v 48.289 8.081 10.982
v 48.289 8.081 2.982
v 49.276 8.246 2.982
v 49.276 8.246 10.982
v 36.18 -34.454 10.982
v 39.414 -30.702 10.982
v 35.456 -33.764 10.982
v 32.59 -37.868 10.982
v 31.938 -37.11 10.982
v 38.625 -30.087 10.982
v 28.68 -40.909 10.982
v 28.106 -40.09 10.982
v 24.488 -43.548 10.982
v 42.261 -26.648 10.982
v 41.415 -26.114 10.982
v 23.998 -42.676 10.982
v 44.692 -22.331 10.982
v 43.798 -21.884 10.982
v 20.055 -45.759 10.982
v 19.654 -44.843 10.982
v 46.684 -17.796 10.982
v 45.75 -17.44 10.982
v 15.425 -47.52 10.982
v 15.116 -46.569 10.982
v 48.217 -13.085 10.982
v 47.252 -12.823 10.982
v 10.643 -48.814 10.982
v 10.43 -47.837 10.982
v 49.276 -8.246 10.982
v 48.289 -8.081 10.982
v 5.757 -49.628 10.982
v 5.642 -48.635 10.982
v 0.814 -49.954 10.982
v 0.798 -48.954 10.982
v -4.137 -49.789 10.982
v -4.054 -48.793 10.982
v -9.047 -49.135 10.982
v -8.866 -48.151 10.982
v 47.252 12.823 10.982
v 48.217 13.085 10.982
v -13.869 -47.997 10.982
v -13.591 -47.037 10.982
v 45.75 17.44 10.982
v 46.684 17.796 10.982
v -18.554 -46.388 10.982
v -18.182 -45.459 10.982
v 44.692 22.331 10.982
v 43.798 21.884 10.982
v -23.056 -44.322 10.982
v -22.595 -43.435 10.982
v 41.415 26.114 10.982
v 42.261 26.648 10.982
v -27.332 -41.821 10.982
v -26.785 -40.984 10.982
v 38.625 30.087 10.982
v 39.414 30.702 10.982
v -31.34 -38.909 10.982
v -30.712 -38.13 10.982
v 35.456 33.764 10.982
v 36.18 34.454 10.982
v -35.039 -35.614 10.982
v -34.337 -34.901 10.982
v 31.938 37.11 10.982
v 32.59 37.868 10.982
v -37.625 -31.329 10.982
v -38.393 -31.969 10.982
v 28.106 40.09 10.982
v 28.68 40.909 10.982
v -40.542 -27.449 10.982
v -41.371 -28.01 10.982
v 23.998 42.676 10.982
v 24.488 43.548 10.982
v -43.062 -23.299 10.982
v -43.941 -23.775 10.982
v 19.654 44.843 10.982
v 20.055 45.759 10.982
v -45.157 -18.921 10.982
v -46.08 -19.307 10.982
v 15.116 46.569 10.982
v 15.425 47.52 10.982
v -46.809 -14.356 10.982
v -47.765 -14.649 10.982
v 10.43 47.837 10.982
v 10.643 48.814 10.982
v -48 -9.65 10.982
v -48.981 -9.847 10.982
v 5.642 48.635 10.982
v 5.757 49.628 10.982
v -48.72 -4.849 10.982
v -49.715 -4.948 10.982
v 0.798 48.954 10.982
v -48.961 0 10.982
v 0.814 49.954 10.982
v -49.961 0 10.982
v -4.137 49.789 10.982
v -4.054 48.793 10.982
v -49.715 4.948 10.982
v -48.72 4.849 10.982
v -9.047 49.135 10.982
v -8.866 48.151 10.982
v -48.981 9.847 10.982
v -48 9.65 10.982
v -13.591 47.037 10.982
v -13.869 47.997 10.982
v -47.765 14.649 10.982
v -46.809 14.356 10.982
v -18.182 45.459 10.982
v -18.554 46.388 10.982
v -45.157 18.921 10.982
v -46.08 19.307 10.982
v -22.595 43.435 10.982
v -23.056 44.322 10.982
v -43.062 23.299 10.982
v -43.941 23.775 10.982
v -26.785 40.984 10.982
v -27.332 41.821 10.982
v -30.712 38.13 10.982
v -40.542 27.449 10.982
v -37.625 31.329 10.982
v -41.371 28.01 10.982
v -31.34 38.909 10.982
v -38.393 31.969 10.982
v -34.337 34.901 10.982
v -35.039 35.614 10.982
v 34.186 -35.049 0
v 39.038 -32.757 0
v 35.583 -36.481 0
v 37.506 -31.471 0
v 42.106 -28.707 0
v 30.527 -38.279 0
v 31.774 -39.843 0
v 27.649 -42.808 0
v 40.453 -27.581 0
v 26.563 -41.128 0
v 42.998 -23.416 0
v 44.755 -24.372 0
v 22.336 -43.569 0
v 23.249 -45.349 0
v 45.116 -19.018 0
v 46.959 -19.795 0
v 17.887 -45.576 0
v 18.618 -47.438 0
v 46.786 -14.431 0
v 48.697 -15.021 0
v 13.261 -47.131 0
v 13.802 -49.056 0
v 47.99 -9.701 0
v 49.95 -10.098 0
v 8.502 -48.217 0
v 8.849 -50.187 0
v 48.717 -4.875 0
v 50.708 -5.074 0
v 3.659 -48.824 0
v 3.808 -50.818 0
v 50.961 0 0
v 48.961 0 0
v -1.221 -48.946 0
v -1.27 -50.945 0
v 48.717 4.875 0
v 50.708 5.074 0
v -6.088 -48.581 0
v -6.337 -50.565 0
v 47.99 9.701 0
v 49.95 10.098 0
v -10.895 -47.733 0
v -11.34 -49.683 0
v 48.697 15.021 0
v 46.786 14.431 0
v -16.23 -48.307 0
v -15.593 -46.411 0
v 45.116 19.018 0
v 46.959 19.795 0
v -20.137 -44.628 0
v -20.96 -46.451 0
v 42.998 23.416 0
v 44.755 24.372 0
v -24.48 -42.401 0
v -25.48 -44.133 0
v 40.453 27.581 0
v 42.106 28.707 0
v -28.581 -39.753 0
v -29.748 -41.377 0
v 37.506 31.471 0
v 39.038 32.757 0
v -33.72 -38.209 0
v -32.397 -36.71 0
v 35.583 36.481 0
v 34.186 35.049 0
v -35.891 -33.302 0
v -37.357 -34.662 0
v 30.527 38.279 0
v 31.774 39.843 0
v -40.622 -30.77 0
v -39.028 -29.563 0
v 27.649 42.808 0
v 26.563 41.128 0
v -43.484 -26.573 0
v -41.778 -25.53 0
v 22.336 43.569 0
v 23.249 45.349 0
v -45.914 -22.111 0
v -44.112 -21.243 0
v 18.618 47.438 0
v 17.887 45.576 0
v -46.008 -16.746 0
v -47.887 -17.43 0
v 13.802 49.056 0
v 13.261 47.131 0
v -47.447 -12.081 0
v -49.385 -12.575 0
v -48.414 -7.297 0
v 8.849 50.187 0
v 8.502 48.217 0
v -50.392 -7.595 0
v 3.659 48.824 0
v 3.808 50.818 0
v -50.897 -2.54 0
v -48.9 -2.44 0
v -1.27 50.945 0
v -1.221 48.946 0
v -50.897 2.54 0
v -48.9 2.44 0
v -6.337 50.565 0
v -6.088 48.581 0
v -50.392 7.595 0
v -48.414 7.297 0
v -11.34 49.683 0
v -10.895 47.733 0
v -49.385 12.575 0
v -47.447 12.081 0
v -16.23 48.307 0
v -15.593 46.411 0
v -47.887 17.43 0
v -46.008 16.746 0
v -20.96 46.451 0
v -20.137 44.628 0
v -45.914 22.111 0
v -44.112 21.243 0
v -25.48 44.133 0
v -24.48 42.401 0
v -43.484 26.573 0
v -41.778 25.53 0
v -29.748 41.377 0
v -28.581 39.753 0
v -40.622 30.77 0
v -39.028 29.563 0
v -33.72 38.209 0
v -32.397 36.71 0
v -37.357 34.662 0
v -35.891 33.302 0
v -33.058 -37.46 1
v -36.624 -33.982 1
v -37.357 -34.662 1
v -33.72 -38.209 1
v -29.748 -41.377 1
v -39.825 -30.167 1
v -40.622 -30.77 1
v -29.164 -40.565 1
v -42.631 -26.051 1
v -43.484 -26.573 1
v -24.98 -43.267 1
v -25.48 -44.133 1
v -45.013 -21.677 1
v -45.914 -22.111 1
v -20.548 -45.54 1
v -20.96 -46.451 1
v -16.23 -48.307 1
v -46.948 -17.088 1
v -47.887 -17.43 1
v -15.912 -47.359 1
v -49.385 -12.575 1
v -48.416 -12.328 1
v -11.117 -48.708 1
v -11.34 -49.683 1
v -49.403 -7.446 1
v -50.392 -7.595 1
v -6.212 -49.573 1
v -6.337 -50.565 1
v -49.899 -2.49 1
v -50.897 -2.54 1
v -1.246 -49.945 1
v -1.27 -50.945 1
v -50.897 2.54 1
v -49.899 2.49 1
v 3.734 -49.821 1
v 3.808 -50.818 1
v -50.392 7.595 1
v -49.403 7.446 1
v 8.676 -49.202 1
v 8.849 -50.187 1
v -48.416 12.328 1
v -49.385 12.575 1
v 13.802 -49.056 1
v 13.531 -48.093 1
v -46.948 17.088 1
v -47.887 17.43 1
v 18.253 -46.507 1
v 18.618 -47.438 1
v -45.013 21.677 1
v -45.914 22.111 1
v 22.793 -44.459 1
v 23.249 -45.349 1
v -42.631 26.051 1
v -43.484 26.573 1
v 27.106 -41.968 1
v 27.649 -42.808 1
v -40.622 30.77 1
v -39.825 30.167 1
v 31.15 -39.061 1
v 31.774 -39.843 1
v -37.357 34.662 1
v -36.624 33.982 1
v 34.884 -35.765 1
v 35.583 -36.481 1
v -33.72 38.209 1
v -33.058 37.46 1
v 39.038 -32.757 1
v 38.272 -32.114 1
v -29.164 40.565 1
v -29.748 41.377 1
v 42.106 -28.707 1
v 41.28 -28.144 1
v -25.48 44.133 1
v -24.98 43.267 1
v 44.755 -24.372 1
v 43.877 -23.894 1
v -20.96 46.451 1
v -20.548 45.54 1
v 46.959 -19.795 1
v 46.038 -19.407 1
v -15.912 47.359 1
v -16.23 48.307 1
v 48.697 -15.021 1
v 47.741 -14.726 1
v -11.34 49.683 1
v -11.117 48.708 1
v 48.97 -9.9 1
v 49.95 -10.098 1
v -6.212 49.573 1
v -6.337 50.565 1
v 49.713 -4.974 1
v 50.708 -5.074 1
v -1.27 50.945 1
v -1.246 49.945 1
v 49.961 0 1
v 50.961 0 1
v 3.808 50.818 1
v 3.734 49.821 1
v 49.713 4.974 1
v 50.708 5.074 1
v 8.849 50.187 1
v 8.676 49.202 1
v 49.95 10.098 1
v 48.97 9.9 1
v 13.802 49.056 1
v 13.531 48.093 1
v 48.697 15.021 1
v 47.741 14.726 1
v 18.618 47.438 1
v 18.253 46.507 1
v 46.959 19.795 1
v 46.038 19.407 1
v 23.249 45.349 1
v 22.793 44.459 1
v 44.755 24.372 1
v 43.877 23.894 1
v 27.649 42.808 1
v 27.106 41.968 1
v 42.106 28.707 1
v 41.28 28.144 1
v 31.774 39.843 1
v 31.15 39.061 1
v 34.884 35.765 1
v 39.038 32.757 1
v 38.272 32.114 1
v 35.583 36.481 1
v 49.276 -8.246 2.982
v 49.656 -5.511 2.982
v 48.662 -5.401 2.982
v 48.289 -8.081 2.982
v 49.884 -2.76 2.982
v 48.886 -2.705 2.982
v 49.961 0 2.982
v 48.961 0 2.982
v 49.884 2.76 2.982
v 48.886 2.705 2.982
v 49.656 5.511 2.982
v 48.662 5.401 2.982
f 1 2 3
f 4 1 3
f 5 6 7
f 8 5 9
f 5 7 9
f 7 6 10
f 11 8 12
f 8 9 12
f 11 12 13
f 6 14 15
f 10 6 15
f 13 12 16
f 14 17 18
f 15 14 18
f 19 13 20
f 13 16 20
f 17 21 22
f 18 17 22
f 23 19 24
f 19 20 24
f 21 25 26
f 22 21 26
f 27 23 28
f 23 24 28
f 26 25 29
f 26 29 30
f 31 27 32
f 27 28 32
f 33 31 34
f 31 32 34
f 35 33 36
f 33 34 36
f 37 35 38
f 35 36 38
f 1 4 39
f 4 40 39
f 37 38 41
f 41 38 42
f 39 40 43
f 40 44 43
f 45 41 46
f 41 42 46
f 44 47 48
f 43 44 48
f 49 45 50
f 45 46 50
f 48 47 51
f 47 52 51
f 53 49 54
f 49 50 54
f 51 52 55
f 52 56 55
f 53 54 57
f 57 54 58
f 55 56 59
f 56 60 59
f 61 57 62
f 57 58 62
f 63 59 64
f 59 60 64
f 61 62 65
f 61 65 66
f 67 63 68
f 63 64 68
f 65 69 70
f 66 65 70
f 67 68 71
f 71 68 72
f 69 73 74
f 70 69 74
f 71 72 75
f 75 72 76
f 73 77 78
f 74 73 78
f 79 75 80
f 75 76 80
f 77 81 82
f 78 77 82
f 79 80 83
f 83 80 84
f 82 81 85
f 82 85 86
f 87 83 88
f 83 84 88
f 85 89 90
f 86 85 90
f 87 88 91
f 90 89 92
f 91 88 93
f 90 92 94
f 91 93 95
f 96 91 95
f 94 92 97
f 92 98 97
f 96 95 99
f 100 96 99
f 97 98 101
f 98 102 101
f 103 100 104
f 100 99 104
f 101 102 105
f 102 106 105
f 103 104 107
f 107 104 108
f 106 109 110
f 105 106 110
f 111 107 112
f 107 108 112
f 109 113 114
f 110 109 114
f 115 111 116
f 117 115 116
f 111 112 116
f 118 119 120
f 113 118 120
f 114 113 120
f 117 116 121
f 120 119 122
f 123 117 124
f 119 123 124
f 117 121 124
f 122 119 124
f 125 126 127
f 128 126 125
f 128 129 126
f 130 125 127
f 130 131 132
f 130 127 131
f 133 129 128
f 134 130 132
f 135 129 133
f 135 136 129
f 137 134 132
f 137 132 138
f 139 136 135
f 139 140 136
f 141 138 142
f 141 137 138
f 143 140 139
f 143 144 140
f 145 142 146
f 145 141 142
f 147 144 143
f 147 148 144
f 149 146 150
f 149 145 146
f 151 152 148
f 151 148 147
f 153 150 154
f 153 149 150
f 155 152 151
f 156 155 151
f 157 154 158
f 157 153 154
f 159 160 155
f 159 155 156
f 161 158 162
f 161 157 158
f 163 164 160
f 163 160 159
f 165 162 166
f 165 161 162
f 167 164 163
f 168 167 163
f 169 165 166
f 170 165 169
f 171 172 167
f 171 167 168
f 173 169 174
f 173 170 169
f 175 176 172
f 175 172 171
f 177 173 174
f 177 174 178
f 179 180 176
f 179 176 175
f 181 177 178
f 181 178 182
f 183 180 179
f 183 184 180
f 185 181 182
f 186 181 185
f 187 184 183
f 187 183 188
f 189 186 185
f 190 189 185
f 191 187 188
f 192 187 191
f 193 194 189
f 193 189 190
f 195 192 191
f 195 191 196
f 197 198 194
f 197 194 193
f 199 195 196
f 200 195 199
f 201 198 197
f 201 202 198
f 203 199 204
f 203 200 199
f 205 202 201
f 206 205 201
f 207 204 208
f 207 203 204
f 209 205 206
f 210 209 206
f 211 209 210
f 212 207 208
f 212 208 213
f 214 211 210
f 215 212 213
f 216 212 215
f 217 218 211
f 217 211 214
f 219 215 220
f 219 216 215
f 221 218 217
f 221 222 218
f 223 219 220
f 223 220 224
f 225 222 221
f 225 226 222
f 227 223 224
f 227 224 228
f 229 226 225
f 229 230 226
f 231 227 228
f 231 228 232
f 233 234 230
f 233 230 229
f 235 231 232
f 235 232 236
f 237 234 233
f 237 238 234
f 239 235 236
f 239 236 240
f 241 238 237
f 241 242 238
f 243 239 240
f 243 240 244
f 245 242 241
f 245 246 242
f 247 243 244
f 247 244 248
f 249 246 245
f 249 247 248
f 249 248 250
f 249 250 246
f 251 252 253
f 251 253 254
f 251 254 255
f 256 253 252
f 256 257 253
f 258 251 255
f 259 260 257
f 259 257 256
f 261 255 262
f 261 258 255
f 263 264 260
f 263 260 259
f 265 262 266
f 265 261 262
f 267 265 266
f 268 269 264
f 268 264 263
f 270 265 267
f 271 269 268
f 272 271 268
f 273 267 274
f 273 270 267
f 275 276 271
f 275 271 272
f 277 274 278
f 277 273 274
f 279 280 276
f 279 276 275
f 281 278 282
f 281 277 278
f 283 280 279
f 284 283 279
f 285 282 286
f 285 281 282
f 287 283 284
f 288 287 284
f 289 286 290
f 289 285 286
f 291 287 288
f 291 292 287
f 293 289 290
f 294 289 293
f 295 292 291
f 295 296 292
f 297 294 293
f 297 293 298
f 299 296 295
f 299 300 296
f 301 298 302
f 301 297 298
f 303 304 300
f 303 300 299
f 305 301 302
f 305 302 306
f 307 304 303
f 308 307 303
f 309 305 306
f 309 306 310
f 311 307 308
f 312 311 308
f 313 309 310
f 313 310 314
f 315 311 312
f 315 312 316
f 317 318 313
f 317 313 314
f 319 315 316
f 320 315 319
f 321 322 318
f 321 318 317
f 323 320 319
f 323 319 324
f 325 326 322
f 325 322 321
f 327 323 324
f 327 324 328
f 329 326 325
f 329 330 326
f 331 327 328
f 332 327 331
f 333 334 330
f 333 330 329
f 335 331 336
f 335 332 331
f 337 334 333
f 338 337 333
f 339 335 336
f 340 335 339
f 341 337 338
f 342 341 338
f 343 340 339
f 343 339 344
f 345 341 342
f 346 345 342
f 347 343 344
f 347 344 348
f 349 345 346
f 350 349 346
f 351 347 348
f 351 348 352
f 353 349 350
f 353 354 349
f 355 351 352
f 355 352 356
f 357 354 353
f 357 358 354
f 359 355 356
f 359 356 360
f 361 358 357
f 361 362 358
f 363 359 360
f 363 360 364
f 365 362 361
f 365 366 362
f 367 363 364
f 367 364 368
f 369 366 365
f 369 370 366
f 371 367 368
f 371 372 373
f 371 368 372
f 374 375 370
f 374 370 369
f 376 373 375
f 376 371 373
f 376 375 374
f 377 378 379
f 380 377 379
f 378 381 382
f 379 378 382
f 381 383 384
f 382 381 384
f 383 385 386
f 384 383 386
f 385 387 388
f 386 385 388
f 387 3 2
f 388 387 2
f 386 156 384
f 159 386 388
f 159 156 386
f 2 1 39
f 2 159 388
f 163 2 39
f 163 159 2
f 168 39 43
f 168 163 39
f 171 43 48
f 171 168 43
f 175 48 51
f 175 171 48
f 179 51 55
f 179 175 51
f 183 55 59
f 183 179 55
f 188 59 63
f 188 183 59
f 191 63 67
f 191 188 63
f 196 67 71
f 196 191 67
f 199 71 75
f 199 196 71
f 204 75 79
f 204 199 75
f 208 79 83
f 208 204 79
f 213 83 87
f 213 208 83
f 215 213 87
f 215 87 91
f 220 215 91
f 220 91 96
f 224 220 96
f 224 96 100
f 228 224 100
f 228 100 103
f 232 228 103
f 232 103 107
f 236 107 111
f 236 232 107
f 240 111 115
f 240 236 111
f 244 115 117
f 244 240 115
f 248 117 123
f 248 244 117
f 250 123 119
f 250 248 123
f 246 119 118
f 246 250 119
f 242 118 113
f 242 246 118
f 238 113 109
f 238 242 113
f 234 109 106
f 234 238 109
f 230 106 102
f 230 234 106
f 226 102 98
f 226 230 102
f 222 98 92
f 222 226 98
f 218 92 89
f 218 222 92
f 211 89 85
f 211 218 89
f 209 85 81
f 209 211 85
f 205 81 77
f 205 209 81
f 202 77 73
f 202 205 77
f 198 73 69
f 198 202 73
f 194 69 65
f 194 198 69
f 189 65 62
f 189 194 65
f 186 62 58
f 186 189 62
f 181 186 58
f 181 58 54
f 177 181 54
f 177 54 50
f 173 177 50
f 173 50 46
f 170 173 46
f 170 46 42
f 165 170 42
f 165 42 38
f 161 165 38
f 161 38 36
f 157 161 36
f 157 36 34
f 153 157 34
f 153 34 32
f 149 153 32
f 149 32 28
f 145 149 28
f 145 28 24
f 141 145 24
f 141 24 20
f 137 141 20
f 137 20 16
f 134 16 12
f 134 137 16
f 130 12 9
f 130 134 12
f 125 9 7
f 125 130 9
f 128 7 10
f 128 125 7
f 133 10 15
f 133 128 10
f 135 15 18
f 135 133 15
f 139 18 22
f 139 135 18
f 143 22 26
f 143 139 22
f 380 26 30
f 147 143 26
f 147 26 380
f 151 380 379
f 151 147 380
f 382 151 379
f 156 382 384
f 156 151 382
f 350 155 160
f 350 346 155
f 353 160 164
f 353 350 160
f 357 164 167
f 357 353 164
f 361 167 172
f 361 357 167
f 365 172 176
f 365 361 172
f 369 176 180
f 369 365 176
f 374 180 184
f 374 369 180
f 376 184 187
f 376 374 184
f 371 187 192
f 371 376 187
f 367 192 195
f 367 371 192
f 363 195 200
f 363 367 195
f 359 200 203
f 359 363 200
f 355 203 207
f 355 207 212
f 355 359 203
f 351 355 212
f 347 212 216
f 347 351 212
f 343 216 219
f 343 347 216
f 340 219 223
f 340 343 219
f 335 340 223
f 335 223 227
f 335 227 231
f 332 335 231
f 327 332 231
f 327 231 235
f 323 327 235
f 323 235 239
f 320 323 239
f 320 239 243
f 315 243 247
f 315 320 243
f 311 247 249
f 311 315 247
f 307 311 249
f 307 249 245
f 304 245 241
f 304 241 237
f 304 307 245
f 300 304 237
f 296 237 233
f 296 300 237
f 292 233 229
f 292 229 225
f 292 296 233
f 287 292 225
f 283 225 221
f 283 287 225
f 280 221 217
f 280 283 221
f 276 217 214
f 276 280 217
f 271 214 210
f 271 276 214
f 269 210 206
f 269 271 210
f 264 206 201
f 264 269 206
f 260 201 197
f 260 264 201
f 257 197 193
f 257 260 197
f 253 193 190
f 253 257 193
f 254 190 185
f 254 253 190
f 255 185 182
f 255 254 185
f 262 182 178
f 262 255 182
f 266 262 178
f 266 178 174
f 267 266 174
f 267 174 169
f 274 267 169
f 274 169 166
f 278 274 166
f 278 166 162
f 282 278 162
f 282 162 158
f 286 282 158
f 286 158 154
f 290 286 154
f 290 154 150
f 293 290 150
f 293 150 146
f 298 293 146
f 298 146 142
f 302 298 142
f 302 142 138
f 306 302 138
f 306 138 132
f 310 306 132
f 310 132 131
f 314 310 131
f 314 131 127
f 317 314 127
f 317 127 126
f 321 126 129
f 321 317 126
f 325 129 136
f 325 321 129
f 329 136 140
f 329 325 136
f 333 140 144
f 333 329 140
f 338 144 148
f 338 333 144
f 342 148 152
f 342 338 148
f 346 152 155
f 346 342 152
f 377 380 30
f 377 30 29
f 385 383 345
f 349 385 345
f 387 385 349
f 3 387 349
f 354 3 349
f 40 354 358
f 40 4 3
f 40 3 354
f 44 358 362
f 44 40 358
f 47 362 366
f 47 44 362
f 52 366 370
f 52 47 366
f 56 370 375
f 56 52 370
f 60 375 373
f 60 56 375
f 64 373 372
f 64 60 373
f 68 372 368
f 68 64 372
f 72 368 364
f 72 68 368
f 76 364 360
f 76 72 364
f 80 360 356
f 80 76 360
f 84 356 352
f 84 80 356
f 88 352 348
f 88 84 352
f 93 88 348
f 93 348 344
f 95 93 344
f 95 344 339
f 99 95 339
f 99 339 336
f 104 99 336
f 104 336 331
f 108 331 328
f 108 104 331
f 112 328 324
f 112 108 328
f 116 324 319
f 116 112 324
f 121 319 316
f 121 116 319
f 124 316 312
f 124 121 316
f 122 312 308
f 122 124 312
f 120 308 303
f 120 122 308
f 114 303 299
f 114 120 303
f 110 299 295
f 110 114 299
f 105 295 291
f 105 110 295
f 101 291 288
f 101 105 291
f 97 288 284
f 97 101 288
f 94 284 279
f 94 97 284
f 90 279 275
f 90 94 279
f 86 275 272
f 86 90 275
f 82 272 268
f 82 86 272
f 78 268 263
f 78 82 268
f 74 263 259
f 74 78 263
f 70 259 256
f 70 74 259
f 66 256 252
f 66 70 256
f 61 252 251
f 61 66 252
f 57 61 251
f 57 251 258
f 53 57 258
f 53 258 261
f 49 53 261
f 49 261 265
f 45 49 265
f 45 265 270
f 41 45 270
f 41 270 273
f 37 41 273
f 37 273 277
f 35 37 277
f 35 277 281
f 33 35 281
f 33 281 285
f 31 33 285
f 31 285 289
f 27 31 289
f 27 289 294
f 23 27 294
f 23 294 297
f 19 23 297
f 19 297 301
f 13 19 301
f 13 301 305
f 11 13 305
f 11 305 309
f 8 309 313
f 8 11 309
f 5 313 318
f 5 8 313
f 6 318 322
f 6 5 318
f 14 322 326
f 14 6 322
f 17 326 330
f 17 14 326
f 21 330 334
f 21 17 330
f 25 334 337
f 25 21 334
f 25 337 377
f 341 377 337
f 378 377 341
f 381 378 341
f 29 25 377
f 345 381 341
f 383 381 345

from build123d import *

# Parameters (mm, degrees)
F0_W          = 1
F0_H          = 8
F2_ANGLE_BACK = 9.5
F2_ANGLE      = 19


with BuildPart() as f1:
    # F0 (on Front) → F1 (revolve)
    with BuildSketch(Plane.XZ):
        Polygon((48.960784, 2.9816715978), (48.960784, 0), (50.960784, 0), (50.960784, 1), (49.960784, 1), (49.960784, 2.9816715978), align=None)
        with Locations((49.460784, 6.9816715978)):
            Rectangle(F0_W, F0_H)
    revolve(axis=Axis((0, 0, 8.8810138404), (0, 0, 1)))

    # F0 (on Front) → F2 (revolve, cut)
    with BuildSketch(Plane.XZ, mode=Mode.PRIVATE) as f2_sk:
        with Locations((49.460784, 6.9816715978)):
            Rectangle(F0_W, F0_H)
    revolve(f2_sk.sketch.rotate(Axis((0, 0, 8.8810138404), (0, 0, 1)), -F2_ANGLE_BACK), axis=Axis((0, 0, 8.8810138404), (0, 0, 1)), revolution_arc=F2_ANGLE, mode=Mode.SUBTRACT)


solid = f1.part
